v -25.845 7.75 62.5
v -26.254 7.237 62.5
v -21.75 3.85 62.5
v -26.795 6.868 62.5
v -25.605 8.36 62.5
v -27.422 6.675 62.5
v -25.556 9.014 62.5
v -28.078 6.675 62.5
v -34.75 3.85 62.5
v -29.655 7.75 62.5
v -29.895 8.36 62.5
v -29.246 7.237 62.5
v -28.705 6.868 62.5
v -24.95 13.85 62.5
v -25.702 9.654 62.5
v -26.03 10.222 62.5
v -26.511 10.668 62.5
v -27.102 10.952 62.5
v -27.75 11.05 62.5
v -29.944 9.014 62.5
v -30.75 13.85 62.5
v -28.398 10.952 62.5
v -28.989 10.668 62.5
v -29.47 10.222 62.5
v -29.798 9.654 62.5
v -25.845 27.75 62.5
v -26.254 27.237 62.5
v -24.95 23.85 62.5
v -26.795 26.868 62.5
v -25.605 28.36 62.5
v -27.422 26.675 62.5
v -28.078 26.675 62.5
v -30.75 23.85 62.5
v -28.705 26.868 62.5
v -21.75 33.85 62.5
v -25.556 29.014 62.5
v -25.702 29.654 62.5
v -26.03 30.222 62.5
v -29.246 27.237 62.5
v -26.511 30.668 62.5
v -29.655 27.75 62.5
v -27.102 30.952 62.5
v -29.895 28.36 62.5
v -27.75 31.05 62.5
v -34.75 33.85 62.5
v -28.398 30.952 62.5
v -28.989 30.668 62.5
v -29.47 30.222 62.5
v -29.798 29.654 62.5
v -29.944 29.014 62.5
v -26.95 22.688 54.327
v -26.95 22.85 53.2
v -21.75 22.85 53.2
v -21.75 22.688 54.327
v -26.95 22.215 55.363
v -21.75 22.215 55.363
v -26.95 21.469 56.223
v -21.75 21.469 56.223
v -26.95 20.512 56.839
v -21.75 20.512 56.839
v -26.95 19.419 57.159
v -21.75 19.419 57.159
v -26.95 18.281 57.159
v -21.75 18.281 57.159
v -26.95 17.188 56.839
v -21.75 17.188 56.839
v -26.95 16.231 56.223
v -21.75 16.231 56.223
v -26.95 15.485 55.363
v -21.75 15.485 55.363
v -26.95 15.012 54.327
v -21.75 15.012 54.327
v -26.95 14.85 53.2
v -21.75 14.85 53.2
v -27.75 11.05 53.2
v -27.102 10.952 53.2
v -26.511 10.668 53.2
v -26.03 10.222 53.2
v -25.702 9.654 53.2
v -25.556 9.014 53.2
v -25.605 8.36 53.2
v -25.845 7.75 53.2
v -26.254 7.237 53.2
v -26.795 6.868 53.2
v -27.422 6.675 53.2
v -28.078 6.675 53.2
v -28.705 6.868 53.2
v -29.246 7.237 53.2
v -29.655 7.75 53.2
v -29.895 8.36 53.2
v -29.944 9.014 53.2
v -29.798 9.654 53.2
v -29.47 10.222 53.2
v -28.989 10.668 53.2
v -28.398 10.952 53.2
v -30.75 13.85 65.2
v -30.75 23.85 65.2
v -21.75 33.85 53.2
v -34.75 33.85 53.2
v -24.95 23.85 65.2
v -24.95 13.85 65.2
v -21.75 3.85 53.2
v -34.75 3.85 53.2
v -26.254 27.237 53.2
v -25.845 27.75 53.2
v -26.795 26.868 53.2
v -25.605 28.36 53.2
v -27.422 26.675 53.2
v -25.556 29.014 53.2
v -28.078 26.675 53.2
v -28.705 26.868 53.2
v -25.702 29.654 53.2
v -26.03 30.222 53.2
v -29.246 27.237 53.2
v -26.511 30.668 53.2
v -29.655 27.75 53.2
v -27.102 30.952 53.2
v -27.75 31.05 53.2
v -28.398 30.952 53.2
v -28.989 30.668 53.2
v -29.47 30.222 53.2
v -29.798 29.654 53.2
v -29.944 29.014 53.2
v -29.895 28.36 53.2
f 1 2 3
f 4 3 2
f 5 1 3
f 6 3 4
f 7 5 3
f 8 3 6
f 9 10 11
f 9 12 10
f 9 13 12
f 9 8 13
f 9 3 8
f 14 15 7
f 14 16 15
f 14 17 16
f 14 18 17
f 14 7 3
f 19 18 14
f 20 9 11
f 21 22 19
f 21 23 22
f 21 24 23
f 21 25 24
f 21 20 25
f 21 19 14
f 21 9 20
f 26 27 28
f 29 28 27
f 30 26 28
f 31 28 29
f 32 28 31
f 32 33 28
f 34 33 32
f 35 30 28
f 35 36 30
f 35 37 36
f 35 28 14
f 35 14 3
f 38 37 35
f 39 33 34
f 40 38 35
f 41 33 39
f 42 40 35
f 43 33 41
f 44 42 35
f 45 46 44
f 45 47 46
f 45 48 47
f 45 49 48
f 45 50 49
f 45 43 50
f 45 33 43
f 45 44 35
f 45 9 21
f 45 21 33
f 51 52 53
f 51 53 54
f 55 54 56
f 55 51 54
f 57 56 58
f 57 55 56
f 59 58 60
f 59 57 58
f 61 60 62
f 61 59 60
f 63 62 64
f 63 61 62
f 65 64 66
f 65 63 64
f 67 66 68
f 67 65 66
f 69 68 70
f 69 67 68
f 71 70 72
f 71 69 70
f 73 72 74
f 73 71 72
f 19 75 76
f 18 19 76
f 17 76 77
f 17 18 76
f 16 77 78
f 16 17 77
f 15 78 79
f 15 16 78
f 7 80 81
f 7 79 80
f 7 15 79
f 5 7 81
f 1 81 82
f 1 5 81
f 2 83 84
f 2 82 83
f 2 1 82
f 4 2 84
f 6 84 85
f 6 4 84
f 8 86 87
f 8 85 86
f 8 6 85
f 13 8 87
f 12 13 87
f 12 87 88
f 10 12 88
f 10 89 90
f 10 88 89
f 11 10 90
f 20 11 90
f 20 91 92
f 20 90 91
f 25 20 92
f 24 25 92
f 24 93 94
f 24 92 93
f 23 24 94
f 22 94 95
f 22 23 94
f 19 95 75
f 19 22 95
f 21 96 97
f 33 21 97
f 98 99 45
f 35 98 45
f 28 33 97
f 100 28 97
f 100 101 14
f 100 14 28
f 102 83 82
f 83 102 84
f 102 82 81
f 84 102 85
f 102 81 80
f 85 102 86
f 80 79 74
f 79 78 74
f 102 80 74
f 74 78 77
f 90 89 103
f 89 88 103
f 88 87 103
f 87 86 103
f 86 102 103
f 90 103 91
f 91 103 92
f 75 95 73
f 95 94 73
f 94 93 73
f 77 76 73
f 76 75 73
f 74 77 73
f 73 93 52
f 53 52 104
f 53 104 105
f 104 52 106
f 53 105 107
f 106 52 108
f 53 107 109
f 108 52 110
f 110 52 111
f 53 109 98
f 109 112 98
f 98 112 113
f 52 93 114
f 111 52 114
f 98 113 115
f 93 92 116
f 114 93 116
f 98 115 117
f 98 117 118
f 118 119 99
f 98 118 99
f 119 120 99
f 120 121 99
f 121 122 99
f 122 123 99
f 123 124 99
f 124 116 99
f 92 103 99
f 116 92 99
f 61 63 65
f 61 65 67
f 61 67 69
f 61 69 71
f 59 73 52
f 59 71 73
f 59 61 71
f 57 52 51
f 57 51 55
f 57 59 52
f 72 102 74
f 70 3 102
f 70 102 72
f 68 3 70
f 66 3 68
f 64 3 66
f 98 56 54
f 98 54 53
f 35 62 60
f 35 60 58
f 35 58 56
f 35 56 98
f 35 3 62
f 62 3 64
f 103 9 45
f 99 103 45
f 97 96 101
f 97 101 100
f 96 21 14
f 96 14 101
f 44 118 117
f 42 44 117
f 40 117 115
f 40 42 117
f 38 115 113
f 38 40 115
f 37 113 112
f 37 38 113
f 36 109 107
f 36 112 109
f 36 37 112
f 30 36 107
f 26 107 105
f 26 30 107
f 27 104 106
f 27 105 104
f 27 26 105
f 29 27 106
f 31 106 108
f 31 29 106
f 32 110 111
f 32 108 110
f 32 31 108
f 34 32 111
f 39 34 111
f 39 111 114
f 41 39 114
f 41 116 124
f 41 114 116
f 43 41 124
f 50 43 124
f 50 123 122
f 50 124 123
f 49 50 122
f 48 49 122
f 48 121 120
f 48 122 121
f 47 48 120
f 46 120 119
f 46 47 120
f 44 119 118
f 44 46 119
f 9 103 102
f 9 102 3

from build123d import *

# Parameters (mm, degrees)
BOX056_W                  = 10
BOX056_H                  = 4
BOX056_DEPTH              = 5.8
CYLINDER077_R             = 2.2
CYLINDER077_DEPTH         = 25
CYLINDER076_R             = 2.2
CYLINDER076_DEPTH         = 25
CYLINDER075_R             = 4
CYLINDER075_DEPTH         = 6
BOX055_W                  = 30
BOX055_H                  = 9.3
BOX055_DEPTH              = 13
FUSION042_ROLL_ANGLE      = 90
FUSION042_PLACEMENT_ANGLE = 90


with BuildPart() as quader035:
    # Box056 → Box056 (new body)
    with BuildSketch(Plane(origin=(-5, 8, 2), x_dir=(1, 0, 0), z_dir=(0, 0, 1))):
        with Locations((5, 2)):
            Rectangle(BOX056_W, BOX056_H)
    extrude(amount=BOX056_DEPTH)


with BuildPart() as zylinder066:
    # Cylinder077 → Cylinder077 (new body)
    with BuildSketch(Plane(origin=(-10, 12, 5), x_dir=(1, 0, 0), z_dir=(0, -1, 0))):
        Circle(CYLINDER077_R)
    extrude(amount=CYLINDER077_DEPTH)


with BuildPart() as zylinder065:
    # Cylinder076 → Cylinder076 (new body)
    with BuildSketch(Plane(origin=(10, 12, 5), x_dir=(1, 0, 0), z_dir=(0, -1, 0))):
        Circle(CYLINDER076_R)
    extrude(amount=CYLINDER076_DEPTH)


with BuildPart() as zylinder064:
    # Cylinder075 → Cylinder075 (new body)
    with BuildSketch(Plane.XY.offset(5.8)):
        Circle(CYLINDER075_R)
    extrude(amount=CYLINDER075_DEPTH)


with BuildPart() as y_drive_mount001:
    # Box055 → Box055 (new body)
    with BuildSketch(Plane(origin=(-15, 0, -2), x_dir=(1, 0, 0), z_dir=(0, 0, 1))):
        with Locations((15, 4.65)):
            Rectangle(BOX055_W, BOX055_H)
    extrude(amount=BOX055_DEPTH)

    # Cut084: cut Zylinder064
    add(zylinder064.part, mode=Mode.SUBTRACT)

    # Cut085: cut Zylinder065
    add(zylinder065.part, mode=Mode.SUBTRACT)

    # Cut086: cut Zylinder066
    add(zylinder066.part, mode=Mode.SUBTRACT)

    # Fusion042: union Quader035
    add(quader035.part)


with BuildPart() as y_drive_mount001_1:
    # Fusion042 roll: moved
    add(y_drive_mount001.part.rotate(Axis((0, 0, 0), (1, 0, 0)), FUSION042_ROLL_ANGLE))


with BuildPart() as y_drive_mount001_2:
    # Fusion042 placement: moved
    add(y_drive_mount001_1.part.moved(Location((-32.75, 18.85, 53.2))).rotate(Axis((-32.75, 18.85, 53.2), (0, 0, 1)), FUSION042_PLACEMENT_ANGLE))


solid = y_drive_mount001_2.part
